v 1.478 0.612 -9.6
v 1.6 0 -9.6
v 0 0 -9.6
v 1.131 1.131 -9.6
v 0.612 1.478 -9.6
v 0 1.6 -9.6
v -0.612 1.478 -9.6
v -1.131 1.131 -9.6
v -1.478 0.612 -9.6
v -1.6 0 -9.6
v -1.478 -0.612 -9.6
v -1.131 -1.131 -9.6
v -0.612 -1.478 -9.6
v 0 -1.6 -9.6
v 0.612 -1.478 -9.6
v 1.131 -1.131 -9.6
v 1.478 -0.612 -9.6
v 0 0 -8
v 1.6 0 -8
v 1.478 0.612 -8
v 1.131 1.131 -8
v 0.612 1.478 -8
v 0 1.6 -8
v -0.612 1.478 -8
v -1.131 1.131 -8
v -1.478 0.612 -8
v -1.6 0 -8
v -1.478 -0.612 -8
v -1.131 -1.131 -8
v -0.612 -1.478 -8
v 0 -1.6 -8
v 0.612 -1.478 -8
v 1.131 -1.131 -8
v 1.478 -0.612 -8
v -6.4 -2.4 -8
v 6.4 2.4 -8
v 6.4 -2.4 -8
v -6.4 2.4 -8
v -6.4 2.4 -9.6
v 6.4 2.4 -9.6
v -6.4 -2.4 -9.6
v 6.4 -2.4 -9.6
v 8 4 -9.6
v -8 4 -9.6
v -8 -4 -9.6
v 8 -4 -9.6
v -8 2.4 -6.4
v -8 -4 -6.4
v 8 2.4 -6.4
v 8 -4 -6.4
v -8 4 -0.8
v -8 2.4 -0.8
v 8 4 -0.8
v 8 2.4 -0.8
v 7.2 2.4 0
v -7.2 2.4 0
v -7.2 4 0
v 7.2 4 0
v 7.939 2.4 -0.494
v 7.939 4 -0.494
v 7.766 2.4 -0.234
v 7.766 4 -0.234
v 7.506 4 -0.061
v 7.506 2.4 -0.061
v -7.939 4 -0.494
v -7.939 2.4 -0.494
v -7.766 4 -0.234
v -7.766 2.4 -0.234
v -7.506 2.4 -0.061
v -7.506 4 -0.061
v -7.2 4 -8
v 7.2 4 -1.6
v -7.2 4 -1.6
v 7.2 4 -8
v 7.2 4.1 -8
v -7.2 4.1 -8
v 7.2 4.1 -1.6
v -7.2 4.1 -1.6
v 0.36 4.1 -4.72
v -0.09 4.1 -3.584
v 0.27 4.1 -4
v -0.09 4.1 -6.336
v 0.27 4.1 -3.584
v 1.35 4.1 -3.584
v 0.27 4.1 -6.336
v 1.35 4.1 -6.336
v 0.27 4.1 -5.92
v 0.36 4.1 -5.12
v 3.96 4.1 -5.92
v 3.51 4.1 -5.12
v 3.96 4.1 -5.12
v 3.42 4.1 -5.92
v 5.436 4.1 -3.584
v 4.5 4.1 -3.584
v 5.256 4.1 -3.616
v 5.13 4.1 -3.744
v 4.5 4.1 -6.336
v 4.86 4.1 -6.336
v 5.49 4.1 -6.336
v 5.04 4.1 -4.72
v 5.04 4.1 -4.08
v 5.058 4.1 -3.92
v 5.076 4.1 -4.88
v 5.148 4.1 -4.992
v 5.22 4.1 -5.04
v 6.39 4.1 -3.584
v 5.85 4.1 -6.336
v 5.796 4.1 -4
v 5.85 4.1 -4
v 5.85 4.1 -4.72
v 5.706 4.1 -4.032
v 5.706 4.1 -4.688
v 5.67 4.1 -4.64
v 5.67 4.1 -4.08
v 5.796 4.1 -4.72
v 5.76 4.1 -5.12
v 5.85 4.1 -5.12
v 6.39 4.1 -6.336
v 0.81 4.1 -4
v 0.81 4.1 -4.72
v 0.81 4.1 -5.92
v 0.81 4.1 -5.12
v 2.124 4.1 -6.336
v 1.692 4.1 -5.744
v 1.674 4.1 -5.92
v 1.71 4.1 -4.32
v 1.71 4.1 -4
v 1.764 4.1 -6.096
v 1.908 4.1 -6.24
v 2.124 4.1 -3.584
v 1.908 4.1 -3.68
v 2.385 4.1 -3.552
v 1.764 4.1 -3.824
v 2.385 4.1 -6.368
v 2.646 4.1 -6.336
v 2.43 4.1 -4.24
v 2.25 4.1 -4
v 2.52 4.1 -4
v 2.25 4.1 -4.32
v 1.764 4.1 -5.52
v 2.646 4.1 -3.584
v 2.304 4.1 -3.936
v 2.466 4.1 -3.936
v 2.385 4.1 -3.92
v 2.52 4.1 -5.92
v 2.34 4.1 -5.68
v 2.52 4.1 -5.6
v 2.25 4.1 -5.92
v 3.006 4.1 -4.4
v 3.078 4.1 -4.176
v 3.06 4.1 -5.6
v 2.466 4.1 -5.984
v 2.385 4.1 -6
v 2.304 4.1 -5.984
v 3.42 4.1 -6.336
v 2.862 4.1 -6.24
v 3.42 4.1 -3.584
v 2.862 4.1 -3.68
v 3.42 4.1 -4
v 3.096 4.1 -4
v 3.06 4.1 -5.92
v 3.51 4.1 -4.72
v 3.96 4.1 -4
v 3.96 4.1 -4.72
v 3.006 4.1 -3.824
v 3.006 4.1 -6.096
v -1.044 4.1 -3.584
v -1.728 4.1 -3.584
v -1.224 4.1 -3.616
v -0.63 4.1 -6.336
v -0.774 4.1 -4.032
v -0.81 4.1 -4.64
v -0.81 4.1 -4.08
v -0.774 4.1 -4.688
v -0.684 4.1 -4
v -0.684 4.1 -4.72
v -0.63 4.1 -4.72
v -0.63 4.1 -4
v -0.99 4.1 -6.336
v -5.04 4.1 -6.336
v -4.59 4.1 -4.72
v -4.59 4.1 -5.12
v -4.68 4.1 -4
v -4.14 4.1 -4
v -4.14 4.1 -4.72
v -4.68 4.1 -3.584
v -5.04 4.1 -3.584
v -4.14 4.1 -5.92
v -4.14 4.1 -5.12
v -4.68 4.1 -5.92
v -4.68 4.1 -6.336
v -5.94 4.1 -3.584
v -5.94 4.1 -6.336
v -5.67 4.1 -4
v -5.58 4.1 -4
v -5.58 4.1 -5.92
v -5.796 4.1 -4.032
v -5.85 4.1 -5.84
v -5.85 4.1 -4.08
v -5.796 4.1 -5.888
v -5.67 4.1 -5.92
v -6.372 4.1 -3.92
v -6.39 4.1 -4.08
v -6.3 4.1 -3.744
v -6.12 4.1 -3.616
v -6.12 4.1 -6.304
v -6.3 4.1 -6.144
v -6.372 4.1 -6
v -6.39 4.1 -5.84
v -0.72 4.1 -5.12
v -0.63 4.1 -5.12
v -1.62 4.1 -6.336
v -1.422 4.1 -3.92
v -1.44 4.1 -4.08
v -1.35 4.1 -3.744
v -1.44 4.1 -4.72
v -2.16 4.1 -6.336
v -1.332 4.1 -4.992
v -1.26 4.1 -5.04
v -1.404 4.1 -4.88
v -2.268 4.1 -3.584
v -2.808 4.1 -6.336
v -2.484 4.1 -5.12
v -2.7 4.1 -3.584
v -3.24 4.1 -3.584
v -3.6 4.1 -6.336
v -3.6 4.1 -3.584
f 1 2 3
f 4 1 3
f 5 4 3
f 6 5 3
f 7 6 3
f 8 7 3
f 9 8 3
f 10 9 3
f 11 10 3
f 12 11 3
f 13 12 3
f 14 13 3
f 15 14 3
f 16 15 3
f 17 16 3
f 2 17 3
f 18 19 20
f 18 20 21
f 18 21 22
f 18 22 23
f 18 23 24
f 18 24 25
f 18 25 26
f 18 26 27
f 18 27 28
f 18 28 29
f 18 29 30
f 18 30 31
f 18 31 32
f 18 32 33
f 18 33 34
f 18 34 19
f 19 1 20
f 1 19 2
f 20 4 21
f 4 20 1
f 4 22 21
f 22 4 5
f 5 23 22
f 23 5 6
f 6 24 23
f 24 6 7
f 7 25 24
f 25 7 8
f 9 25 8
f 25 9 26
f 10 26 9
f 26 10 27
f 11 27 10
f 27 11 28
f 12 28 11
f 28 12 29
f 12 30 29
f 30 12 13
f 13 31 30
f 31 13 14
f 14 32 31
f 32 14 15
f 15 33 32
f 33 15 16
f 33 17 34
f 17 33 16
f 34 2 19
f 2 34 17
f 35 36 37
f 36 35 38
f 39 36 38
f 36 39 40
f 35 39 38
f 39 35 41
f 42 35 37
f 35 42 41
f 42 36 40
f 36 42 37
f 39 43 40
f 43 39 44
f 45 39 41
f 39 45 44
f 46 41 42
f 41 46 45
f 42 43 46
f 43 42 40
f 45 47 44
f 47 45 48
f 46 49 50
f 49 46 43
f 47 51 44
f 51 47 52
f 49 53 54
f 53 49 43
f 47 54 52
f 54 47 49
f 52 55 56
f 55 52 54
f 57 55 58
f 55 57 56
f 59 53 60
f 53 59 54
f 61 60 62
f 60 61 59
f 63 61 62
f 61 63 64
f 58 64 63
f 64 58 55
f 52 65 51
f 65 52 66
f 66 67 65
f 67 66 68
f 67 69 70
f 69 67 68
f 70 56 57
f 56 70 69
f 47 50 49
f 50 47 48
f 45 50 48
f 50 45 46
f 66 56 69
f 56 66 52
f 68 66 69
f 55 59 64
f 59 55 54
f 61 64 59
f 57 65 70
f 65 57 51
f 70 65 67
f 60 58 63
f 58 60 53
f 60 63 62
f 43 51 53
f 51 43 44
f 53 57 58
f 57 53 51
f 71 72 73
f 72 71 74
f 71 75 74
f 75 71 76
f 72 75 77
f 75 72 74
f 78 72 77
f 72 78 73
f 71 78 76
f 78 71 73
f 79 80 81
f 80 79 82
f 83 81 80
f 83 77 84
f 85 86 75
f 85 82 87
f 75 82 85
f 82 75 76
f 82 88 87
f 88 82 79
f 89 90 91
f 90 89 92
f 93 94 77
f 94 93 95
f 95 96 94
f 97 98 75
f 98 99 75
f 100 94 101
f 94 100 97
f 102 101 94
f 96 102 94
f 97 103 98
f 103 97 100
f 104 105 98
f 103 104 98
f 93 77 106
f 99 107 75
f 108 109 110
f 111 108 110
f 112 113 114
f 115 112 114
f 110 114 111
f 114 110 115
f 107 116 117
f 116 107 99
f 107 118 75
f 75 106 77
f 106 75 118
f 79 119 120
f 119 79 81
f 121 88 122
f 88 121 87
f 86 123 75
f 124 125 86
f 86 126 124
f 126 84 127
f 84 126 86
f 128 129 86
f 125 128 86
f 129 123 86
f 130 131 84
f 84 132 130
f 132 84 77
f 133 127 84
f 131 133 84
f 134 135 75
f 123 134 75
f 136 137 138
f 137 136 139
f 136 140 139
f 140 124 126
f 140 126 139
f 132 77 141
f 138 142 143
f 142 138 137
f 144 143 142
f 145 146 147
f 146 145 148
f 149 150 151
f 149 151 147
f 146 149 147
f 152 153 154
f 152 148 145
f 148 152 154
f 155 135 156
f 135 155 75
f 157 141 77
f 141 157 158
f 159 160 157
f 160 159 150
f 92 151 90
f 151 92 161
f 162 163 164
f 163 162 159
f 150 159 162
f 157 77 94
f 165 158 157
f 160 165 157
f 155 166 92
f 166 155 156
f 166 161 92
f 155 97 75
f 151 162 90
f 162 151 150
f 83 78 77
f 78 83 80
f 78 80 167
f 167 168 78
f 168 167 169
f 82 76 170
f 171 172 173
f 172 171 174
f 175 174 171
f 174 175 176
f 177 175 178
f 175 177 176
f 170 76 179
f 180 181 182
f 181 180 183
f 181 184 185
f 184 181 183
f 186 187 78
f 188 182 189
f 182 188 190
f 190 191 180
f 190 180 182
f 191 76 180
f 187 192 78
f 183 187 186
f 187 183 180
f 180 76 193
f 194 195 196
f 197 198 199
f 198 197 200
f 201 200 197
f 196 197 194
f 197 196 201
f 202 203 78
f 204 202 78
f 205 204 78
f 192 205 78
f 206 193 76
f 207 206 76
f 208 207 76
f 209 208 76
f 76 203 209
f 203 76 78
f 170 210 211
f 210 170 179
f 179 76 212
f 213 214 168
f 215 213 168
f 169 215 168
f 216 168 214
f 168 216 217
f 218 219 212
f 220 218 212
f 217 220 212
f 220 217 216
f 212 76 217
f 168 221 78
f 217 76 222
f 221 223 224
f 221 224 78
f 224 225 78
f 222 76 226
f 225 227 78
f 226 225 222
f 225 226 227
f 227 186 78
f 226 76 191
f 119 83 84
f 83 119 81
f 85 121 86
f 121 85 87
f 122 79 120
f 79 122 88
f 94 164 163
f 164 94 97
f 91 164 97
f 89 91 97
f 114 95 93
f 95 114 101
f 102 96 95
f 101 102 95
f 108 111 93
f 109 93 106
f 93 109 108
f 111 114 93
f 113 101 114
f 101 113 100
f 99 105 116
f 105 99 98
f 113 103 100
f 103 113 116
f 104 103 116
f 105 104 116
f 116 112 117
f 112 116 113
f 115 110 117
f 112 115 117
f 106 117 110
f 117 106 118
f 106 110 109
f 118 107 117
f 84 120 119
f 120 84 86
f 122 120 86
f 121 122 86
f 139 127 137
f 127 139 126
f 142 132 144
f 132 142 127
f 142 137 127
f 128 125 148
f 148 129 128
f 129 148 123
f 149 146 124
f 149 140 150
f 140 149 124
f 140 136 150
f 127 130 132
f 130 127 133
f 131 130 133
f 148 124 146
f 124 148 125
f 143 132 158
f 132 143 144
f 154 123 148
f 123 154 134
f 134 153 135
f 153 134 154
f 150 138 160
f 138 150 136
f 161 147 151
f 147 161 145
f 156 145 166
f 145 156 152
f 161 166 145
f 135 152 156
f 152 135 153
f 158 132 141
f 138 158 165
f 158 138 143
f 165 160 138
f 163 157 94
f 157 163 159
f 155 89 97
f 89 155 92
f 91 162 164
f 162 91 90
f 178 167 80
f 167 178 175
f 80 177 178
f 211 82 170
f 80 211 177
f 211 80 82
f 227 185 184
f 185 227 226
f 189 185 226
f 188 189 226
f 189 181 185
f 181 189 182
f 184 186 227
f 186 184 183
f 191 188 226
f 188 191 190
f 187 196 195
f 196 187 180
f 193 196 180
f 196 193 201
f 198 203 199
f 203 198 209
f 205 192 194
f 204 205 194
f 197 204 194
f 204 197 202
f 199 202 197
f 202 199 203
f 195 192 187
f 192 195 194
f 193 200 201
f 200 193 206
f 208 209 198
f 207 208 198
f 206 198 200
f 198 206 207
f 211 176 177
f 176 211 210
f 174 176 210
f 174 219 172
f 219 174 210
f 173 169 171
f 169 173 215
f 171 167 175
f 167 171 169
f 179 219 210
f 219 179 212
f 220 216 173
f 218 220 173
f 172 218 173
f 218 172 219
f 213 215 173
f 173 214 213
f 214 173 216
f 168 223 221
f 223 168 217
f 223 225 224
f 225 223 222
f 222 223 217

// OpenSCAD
use <../lib.scad>
use <4865b.scad>
use <6288456d.scad>
function ldraw_lib__4865bdx0() = [
// 0 Panel  1 x  2 x  1 with Rounded Corners with White "RESERVED" on Black Background Sticker
// 0 Name: 4865bdx0.dat
// 0 Author: Vincent Messenet [Cheenzo]
// 0 !LDRAW_ORG Shortcut UPDATE 2024-04
// 0 !LICENSE Licensed under CC BY 4.0 : see CAreadme.txt
// 
// 0 BFC CERTIFY CCW
  [0,"BFC","CERTIFY"],
  [0,"BFC","CCW"],
// 
// 0 !CATEGORY Sticker Shortcut
// 0 !KEYWORDS Central, Friends, Perk, Set 21319
// 
// 0 !PREVIEW 16 0 0 0 -1 0 0 0 1 0 0 0 -1
// 
// 0 !HISTORY 2020-06-28 [PTadmin] Official Update 2020-01
// 0 !HISTORY 2024-05-27 [OrionP] Change category to Sticker Shortcut
// 0 !HISTORY 2024-05-28 [OrionP] Official Update 2024-04
// 
// 
// 1 16 0 0 0 1 0 0 0 1 0 0 0 1 4865b.dat
  [1,16,0,0,0,1,0,0,0,1,0,0,0,1, ldraw_lib__4865b()],
// 1 16 0 12 10 -1 0 0 0 0 -1 0 -1 0 6288456d.dat
  [1,16,0,12,10,-1,0,0,0,0,-1,0,-1,0, ldraw_lib__6288456d()],
];
module ldraw_lib__4865bdx0(step=0, col=false, unit=2/5, alt=false, line=0.2, solid=!$preview)
    makepoly(ldraw_lib__4865bdx0(), step=step, col=col, unit=unit, alt=alt, line=line, solid=solid);
ldraw_lib__4865bdx0(line=0.2);
